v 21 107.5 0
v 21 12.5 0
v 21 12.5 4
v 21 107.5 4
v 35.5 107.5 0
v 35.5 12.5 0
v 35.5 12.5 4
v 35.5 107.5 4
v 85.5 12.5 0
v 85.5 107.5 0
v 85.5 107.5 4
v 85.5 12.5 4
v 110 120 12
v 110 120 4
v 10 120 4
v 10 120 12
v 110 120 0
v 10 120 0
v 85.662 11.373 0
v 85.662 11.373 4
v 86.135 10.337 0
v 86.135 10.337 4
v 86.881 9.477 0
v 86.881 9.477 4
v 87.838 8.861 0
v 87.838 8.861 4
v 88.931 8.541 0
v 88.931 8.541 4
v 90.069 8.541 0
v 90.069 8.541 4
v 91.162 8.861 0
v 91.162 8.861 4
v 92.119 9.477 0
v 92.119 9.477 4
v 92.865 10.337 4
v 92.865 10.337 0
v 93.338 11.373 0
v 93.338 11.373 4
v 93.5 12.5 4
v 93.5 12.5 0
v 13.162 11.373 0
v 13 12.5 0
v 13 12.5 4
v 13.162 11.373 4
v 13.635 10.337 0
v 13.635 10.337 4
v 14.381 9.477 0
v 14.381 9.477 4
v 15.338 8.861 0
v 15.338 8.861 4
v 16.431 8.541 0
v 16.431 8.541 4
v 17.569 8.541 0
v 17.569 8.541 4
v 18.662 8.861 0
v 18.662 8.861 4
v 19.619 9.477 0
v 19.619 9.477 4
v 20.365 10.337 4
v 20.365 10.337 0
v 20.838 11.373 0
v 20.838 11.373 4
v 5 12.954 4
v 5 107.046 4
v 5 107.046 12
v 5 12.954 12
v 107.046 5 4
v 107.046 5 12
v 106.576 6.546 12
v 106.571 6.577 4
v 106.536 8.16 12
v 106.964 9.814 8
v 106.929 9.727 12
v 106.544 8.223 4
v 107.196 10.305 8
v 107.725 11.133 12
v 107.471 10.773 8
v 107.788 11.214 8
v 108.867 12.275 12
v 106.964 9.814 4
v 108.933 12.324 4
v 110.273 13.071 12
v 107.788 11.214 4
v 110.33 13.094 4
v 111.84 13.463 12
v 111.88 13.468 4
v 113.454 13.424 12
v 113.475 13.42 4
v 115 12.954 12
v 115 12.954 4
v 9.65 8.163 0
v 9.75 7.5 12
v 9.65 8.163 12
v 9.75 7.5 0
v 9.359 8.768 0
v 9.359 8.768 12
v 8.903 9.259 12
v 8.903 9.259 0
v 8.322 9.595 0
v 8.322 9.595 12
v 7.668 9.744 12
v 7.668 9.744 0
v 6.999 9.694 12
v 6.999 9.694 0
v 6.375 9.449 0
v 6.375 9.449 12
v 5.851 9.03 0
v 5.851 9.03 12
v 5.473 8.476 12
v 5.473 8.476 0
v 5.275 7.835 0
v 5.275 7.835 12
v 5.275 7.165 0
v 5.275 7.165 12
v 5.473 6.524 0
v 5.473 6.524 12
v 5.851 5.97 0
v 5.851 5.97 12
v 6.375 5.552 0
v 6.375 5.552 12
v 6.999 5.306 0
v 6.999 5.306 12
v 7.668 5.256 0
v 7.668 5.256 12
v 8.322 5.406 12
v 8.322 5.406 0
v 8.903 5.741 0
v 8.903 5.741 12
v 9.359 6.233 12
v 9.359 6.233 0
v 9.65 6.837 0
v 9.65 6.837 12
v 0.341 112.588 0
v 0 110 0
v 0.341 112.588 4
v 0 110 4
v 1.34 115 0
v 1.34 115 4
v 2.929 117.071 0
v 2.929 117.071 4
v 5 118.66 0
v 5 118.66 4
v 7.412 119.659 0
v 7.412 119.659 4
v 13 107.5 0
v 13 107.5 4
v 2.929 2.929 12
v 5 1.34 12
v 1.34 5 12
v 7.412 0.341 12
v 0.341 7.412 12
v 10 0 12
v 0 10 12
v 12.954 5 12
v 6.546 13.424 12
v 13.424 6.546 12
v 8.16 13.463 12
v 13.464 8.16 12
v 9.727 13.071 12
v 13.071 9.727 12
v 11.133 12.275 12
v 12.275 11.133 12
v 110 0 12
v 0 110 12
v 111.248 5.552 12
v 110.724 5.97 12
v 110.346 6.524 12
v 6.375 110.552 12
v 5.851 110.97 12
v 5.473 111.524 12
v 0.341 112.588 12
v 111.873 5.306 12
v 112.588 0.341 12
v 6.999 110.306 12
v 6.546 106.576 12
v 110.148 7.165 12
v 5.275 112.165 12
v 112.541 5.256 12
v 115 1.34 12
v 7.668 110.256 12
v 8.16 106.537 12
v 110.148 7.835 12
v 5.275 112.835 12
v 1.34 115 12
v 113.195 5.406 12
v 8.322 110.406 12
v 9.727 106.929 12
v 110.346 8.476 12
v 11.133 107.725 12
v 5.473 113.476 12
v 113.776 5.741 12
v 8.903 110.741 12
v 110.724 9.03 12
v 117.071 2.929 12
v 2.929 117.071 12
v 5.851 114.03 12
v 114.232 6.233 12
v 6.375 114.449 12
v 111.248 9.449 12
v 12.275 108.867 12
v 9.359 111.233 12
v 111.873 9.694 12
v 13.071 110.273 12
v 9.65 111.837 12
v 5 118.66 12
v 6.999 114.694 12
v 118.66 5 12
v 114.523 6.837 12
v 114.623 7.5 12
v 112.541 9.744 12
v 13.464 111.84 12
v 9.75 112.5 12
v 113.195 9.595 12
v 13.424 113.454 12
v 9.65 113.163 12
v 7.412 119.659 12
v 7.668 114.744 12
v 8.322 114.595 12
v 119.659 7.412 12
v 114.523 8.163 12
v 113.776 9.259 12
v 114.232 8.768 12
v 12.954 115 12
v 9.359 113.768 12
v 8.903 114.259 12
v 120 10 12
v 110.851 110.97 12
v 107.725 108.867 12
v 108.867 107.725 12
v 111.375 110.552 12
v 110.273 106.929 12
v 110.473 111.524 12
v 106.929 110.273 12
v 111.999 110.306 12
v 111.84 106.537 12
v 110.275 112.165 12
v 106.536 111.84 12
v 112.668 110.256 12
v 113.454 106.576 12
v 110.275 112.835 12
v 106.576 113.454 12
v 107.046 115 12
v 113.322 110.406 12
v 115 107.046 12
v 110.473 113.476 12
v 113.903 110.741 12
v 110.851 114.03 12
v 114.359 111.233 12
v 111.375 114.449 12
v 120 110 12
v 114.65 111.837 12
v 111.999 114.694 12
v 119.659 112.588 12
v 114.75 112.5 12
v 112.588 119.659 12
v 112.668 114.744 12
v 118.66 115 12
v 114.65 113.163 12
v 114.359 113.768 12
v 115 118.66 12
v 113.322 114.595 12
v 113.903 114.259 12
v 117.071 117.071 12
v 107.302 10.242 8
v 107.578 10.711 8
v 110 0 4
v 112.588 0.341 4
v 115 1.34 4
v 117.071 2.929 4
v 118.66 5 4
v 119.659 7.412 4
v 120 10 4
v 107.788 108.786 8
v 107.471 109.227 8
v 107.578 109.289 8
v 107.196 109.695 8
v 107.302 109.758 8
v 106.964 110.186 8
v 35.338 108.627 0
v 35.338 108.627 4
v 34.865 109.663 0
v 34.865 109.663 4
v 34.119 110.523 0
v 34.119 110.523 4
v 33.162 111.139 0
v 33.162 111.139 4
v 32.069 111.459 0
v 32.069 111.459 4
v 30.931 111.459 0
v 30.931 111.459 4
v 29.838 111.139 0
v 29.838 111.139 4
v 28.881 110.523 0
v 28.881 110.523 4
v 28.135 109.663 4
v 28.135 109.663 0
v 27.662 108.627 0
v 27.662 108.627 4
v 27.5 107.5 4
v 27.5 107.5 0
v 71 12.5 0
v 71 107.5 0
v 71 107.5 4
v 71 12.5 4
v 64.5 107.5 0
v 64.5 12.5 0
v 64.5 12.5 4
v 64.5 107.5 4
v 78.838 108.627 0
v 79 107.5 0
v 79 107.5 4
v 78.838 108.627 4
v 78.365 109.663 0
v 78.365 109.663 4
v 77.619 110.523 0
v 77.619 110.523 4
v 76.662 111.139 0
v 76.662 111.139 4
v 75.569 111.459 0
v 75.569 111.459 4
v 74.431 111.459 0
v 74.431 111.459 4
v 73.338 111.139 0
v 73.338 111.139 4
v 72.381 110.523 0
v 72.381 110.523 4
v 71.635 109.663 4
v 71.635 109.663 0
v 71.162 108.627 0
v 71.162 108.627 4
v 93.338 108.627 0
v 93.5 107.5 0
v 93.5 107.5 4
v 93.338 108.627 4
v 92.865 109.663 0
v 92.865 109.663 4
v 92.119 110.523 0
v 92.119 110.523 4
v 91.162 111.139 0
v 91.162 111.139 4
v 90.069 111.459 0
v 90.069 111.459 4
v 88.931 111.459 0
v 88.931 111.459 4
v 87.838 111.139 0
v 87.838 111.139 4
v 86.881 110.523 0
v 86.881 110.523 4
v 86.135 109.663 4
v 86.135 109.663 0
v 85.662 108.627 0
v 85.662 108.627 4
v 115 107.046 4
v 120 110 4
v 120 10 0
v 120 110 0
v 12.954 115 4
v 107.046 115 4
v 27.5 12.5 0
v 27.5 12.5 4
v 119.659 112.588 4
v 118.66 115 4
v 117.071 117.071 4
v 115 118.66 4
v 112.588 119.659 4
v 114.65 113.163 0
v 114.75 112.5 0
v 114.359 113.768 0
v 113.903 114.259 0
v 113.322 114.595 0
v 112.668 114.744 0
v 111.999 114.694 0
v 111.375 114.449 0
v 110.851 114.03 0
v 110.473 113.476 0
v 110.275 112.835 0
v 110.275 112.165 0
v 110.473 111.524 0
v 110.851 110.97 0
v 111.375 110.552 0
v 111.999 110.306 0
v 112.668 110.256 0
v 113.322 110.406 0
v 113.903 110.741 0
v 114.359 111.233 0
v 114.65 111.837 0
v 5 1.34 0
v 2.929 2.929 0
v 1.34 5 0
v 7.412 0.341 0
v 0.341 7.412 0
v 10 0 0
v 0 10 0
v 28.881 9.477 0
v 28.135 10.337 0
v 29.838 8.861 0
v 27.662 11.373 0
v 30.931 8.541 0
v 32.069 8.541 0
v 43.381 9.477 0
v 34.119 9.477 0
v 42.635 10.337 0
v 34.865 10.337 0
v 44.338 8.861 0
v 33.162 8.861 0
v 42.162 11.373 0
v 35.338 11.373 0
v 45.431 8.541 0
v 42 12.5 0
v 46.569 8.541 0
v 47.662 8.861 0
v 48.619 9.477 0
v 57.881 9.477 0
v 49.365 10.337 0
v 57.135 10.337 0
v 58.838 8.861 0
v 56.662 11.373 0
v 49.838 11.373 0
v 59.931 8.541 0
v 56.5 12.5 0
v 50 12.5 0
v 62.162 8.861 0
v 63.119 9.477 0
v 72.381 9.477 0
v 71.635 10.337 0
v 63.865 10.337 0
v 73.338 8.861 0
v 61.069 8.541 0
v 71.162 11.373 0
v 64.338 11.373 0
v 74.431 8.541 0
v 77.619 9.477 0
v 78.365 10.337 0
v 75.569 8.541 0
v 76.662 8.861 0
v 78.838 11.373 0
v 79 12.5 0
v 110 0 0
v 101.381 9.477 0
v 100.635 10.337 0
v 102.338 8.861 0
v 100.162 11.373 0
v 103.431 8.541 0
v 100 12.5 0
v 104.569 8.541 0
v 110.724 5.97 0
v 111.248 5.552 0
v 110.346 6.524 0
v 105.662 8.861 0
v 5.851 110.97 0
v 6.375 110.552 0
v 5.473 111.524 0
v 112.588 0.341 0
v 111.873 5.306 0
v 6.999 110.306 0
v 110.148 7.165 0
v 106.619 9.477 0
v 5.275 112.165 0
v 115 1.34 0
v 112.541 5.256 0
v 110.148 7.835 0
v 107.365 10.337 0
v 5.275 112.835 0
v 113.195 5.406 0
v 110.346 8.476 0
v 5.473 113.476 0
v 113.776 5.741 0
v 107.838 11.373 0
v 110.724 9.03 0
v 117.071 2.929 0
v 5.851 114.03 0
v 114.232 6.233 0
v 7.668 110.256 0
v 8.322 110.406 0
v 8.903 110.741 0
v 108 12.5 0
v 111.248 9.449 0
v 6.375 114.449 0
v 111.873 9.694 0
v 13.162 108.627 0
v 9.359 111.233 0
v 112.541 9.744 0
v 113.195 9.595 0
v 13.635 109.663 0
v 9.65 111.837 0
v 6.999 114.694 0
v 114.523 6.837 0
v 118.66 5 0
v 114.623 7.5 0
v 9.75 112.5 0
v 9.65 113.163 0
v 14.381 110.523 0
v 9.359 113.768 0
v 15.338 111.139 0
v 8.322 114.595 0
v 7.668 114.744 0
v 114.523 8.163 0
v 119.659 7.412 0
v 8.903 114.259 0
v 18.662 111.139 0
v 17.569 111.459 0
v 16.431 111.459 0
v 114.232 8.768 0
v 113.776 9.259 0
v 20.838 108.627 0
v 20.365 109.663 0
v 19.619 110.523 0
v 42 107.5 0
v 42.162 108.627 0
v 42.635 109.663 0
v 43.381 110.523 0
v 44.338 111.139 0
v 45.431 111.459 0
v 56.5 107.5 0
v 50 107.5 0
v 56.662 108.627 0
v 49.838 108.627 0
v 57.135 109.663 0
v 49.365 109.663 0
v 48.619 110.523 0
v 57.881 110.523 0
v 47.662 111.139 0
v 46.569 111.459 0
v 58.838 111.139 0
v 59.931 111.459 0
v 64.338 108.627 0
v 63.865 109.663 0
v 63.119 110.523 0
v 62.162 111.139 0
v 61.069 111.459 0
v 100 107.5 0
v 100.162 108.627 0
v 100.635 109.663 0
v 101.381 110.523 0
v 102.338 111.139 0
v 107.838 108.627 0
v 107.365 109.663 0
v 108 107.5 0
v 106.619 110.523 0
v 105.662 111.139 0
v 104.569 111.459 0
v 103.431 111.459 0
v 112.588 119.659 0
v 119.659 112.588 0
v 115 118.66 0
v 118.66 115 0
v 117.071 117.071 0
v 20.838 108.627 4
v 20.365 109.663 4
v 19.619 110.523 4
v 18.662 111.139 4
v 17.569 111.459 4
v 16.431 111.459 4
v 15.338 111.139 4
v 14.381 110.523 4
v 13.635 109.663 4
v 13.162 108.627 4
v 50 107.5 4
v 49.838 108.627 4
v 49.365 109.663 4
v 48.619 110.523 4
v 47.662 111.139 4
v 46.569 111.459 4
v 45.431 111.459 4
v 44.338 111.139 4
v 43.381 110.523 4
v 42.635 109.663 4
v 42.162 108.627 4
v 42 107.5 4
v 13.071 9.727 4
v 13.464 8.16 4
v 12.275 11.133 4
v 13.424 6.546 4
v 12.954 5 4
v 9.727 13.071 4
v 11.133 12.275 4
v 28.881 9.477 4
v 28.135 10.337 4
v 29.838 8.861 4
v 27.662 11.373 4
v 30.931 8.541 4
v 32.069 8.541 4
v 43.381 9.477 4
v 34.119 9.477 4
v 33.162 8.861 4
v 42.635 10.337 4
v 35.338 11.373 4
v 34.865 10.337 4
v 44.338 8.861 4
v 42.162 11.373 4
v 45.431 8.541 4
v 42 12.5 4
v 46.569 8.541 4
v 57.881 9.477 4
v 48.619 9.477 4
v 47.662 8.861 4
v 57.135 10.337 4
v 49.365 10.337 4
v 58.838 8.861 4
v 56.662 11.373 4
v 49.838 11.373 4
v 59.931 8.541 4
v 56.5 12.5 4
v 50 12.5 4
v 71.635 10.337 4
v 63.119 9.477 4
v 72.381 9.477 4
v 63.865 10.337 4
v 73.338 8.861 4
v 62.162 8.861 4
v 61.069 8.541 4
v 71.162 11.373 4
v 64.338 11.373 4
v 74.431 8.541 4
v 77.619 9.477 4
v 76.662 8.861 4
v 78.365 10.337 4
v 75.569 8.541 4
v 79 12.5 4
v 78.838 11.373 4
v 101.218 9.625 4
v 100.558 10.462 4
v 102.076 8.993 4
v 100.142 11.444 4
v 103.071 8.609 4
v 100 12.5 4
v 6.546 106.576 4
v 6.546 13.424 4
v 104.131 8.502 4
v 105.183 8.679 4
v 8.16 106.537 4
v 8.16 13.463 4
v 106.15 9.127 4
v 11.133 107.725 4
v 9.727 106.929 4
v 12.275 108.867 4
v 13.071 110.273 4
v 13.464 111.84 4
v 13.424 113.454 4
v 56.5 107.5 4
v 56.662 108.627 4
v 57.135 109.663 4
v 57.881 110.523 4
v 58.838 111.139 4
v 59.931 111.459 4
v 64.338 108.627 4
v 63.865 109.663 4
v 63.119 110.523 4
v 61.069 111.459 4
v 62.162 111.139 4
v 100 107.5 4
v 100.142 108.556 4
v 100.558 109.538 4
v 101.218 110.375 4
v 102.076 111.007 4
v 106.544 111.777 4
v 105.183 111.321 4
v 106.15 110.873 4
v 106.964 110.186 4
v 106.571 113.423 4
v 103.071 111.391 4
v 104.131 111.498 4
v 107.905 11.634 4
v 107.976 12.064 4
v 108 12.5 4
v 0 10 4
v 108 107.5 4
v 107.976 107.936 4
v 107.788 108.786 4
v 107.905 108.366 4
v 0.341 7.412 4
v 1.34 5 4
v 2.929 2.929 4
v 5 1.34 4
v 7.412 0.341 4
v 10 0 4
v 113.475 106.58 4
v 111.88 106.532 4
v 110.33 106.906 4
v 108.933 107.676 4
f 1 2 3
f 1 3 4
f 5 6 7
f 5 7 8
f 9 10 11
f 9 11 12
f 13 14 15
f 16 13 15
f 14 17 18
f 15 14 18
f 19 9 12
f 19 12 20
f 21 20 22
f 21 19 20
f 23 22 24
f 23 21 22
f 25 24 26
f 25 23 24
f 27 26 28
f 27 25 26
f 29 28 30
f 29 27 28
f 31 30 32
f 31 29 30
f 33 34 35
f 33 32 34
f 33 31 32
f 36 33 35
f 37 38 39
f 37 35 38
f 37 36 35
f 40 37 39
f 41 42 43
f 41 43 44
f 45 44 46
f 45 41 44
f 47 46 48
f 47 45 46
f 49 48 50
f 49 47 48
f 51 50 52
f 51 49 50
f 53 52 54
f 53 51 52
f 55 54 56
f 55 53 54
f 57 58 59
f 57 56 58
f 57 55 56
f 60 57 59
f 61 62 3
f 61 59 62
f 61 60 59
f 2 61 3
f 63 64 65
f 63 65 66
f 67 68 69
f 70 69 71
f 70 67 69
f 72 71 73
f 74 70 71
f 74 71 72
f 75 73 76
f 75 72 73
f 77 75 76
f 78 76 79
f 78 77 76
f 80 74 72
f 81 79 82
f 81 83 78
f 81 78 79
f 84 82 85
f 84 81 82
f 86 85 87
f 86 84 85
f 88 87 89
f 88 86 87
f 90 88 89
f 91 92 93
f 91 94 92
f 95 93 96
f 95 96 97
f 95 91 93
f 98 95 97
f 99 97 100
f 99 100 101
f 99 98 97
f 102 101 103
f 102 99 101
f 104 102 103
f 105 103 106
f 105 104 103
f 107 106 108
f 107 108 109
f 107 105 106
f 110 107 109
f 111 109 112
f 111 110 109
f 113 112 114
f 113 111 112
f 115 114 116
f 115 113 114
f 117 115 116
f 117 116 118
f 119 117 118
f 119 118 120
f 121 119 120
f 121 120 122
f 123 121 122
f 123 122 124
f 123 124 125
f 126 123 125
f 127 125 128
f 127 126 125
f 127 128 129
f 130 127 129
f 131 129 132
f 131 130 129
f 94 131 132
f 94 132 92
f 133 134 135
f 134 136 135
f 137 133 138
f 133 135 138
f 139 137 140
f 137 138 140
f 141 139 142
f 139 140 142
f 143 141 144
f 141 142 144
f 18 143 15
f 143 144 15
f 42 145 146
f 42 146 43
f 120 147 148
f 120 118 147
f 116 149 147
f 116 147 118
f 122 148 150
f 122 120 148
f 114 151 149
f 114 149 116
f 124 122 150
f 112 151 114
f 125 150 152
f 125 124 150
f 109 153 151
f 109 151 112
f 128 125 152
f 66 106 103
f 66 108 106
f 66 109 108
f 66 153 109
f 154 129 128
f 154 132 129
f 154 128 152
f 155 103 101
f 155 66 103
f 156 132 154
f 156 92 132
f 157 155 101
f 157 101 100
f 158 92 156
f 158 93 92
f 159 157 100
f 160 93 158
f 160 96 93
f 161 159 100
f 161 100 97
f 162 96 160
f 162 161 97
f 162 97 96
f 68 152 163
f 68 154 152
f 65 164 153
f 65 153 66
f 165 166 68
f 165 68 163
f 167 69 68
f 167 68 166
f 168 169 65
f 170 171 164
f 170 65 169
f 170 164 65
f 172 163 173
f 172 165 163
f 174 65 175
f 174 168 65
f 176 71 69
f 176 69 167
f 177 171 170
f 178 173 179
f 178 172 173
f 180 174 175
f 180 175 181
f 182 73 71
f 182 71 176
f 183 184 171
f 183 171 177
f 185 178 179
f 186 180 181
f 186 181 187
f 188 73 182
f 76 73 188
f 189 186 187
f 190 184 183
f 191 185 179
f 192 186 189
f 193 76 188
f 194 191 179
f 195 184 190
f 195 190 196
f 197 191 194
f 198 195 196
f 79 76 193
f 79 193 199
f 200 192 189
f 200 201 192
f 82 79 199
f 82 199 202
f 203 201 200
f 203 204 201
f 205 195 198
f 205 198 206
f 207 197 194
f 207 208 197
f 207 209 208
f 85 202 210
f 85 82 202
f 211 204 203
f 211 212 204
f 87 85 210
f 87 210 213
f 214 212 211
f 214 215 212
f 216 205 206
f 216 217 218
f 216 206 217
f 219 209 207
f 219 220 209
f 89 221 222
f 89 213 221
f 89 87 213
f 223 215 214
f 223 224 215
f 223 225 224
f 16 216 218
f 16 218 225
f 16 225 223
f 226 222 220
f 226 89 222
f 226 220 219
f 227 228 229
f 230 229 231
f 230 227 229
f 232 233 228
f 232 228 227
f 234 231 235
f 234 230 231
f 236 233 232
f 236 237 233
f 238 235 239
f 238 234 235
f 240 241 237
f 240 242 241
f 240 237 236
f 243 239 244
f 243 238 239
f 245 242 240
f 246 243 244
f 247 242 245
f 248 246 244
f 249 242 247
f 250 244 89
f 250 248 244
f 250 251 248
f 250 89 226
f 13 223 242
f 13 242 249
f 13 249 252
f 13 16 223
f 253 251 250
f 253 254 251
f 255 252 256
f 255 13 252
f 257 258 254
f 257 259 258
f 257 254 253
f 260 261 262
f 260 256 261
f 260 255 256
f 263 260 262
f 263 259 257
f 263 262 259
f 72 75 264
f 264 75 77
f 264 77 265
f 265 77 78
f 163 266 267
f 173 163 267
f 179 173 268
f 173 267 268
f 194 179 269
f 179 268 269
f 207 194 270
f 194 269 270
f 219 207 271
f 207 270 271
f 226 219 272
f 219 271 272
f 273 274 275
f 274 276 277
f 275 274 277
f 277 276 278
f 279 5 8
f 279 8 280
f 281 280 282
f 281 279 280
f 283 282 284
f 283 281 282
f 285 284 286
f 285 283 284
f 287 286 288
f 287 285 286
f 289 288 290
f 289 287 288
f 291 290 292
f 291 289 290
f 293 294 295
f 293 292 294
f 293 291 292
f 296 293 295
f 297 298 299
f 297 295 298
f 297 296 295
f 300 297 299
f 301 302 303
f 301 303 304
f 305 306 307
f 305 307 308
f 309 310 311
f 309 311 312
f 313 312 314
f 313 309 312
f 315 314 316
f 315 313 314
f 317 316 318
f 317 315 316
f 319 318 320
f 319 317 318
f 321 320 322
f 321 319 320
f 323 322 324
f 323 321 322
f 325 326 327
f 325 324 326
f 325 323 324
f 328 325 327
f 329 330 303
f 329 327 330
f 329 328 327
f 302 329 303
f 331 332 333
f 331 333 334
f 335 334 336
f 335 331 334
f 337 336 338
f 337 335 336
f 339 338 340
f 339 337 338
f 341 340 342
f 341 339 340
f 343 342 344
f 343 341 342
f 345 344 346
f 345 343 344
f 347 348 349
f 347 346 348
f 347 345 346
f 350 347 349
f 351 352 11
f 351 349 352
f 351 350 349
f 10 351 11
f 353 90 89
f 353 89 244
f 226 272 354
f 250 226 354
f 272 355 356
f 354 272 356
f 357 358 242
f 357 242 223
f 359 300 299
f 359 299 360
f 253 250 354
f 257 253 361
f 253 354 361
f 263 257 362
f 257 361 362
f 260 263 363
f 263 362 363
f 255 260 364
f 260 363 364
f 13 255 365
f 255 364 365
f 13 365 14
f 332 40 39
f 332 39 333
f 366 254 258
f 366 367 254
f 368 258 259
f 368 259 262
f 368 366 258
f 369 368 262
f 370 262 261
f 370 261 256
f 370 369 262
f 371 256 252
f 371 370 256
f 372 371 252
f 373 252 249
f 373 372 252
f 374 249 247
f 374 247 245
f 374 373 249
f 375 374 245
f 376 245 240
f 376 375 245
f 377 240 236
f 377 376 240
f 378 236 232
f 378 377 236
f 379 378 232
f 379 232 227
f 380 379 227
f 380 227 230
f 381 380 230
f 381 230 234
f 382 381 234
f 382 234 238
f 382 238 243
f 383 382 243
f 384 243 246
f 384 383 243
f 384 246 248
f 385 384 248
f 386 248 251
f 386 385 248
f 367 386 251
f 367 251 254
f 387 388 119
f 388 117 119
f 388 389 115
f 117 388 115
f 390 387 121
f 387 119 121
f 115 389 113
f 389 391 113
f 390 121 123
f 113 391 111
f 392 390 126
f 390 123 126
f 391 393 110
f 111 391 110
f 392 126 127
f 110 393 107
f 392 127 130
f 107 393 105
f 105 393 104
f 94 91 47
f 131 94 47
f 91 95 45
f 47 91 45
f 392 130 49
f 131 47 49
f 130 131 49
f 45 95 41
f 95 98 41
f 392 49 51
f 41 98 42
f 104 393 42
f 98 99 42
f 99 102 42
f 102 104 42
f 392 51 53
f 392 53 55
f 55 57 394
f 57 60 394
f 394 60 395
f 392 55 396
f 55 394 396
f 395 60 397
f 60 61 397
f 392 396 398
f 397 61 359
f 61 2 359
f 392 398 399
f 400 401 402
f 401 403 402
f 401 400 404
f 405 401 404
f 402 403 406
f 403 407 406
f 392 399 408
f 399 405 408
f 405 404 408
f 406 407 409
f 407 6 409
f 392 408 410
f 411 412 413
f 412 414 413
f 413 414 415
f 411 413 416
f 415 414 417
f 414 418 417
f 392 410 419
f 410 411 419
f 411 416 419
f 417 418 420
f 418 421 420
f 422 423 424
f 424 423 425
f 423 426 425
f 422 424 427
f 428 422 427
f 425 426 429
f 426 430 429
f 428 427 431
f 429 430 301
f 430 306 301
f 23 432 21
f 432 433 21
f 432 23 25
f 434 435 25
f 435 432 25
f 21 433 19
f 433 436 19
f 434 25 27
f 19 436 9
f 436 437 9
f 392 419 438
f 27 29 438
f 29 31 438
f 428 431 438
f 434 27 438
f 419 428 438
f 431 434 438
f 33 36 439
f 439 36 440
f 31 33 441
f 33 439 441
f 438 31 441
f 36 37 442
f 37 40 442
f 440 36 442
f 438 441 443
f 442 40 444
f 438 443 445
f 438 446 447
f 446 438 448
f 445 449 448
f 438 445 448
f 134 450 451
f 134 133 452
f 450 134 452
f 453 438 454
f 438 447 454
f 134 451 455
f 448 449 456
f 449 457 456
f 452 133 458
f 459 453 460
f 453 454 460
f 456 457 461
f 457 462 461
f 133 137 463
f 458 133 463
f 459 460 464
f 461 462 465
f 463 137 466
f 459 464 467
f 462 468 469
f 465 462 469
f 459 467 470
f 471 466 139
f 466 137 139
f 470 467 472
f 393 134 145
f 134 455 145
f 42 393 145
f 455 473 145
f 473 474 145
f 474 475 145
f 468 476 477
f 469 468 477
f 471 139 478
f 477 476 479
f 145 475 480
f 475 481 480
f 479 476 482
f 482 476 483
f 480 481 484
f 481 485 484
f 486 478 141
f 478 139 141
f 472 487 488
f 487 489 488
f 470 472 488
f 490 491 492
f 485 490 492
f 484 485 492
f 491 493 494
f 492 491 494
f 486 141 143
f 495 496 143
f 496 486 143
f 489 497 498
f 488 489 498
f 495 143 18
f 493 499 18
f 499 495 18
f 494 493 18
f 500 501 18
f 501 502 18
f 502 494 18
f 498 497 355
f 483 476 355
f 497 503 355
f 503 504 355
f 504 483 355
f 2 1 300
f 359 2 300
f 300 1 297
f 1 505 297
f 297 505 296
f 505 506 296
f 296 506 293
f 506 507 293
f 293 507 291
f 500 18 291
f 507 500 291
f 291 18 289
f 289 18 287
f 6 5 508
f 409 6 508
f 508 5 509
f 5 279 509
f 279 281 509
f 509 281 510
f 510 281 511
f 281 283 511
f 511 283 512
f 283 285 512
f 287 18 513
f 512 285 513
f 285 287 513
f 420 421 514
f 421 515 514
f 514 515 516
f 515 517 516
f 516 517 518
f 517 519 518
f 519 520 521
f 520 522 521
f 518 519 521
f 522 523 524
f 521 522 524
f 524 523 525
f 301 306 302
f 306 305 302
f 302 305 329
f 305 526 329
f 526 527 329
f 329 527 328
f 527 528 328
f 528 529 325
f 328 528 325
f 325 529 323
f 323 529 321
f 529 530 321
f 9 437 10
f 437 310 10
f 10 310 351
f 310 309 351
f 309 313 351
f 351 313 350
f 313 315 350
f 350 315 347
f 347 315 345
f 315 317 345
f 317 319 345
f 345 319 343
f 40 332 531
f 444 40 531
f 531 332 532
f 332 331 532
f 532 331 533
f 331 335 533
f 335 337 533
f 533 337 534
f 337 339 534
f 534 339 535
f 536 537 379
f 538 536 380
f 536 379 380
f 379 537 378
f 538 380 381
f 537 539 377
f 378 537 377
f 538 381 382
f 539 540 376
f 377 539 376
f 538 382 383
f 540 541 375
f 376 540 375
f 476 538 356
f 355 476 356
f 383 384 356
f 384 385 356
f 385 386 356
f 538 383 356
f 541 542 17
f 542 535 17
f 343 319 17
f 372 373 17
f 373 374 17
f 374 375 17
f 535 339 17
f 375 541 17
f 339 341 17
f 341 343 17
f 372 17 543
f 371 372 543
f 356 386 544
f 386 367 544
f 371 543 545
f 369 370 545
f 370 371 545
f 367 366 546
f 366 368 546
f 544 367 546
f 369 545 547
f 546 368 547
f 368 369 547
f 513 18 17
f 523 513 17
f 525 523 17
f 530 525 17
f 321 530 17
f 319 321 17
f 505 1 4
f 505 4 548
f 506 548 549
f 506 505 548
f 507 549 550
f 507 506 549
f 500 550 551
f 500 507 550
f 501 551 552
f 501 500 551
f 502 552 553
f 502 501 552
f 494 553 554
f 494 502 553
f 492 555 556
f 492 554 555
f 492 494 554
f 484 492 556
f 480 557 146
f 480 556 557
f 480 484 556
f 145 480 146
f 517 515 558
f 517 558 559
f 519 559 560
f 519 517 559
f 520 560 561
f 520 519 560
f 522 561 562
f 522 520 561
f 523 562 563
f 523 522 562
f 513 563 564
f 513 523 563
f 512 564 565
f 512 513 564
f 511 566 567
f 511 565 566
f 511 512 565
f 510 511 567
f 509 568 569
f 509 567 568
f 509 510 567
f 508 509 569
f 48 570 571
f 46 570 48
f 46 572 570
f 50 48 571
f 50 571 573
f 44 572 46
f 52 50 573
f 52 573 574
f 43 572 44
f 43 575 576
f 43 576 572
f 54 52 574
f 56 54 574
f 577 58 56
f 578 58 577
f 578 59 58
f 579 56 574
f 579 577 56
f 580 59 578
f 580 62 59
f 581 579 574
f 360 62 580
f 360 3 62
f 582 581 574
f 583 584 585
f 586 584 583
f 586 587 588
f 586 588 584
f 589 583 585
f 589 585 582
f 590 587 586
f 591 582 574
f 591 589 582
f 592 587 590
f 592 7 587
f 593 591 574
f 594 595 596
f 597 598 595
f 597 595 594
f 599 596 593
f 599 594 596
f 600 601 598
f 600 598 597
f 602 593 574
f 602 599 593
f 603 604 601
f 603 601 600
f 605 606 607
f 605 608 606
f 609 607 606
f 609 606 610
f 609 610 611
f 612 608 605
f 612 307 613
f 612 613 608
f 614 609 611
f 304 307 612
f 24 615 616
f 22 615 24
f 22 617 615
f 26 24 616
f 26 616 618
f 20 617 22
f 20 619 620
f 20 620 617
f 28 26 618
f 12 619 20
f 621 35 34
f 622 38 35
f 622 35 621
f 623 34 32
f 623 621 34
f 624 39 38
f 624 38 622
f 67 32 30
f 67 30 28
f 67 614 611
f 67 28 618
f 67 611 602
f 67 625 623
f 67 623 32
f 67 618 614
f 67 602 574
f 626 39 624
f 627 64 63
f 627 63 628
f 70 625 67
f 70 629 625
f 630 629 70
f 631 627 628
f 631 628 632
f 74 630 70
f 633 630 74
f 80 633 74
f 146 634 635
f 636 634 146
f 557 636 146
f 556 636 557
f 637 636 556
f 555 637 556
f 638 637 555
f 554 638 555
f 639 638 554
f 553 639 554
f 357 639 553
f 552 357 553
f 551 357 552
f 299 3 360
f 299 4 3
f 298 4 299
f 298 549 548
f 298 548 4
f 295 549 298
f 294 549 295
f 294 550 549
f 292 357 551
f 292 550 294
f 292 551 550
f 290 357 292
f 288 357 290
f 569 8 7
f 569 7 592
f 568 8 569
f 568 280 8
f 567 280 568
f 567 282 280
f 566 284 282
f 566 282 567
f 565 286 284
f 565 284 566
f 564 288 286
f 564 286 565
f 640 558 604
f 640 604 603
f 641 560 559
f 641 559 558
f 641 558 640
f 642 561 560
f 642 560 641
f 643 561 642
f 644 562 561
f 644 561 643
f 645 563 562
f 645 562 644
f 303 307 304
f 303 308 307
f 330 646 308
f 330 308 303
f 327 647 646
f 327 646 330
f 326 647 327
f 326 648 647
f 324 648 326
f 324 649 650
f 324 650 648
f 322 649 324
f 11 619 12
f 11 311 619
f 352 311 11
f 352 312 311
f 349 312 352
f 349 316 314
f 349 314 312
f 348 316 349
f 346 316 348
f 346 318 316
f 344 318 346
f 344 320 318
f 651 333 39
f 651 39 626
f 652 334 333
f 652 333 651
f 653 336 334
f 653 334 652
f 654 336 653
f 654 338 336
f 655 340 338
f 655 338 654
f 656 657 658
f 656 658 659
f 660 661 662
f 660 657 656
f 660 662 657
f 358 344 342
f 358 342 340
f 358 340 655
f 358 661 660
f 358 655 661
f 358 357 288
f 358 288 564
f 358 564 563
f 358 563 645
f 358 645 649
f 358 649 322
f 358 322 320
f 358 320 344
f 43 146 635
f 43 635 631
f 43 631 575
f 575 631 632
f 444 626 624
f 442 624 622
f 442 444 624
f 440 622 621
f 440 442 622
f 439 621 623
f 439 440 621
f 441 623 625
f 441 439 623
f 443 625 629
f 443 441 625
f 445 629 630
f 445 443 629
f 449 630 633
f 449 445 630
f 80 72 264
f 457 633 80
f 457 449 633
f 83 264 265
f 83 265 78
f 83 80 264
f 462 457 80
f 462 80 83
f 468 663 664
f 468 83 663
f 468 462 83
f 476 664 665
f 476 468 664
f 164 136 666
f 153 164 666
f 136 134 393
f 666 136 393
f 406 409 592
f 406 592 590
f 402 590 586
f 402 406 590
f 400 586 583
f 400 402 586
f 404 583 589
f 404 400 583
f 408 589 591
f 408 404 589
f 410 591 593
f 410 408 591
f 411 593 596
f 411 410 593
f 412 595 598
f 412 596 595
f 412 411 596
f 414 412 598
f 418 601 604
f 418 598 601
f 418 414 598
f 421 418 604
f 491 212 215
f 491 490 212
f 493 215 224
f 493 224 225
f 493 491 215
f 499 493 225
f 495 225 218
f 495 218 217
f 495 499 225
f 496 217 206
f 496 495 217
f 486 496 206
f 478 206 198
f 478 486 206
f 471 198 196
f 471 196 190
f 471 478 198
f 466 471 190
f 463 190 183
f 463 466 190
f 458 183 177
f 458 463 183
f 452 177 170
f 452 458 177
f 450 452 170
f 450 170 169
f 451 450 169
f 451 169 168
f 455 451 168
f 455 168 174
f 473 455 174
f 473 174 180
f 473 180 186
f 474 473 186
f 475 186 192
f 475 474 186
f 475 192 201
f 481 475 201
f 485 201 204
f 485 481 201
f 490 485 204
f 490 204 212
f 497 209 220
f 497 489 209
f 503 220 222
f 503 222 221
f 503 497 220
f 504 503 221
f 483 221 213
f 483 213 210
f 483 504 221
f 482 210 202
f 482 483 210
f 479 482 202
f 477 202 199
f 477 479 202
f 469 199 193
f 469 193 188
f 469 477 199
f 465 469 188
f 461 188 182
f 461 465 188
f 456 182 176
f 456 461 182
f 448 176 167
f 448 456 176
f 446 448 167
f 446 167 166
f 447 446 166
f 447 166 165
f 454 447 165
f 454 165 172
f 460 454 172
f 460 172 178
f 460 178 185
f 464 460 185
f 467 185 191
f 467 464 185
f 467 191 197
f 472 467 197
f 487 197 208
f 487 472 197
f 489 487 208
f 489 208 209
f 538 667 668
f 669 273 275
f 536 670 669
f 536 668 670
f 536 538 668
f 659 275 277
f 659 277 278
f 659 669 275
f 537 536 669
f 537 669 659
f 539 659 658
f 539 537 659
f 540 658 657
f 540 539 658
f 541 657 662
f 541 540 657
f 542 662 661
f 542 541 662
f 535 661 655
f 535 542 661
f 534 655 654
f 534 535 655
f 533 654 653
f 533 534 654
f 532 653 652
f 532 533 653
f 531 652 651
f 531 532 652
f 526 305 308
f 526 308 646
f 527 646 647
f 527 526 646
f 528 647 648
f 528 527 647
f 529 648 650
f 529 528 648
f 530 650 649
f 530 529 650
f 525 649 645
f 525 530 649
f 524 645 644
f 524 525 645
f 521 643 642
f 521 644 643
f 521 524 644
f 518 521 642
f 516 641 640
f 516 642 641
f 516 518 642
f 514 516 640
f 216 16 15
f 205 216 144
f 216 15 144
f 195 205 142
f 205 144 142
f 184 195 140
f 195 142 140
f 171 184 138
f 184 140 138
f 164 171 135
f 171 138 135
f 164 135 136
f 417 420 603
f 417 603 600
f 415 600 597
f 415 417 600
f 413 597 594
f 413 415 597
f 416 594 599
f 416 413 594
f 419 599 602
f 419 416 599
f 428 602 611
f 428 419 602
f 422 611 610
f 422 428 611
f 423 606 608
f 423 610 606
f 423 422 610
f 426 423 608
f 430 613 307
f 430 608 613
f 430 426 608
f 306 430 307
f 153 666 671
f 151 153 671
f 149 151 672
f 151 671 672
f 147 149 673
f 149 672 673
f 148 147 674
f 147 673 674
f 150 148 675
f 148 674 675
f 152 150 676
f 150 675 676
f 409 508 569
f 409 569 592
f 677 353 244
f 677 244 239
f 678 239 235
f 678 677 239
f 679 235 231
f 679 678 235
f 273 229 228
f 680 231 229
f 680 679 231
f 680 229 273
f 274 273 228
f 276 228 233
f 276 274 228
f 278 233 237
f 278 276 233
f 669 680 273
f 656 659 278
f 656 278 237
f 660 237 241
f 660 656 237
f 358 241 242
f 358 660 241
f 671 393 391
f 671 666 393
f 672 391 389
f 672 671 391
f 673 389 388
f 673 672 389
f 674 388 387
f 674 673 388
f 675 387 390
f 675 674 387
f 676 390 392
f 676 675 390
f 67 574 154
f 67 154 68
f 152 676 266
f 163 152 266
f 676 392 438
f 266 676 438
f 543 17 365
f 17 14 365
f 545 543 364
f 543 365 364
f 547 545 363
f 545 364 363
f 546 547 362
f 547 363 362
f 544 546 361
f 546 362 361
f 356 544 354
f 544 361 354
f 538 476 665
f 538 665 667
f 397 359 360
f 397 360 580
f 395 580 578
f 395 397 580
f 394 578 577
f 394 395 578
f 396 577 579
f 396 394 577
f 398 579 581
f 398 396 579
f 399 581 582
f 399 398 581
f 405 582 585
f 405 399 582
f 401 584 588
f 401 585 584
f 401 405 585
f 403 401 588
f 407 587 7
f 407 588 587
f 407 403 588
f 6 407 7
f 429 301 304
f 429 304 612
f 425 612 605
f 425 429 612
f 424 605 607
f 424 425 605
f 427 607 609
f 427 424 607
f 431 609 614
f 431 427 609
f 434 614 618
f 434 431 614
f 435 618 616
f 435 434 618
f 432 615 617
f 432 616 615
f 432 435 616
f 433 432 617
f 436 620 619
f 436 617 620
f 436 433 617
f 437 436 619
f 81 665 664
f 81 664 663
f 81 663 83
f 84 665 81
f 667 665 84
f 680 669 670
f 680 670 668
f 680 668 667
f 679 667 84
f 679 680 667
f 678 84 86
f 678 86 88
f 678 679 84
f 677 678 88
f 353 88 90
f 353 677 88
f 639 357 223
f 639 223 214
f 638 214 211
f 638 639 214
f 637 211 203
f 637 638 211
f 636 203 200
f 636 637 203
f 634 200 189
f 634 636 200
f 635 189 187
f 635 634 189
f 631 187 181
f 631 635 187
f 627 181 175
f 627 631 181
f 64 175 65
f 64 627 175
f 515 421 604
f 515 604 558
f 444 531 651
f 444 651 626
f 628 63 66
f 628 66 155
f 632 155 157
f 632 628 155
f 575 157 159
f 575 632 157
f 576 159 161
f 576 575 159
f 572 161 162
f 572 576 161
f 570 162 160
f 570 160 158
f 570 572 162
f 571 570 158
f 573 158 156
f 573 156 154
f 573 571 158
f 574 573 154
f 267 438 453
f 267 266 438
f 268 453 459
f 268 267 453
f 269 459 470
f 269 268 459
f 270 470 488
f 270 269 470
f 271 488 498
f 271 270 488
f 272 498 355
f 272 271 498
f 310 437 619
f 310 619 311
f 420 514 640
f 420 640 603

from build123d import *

# Parameters (mm, degrees)
SKETCH1_W           = 120
SKETCH1_H           = 120
SKETCH1_R           = 2.25
BOSS_EXTRUDE1_DEPTH = 4
FILLET1_R           = 10
SKETCH2_R           = 2.25
BOSS_EXTRUDE2_DEPTH = 8
CUT_EXTRUDE1_DEPTH  = 8


with BuildPart() as part:
    # Sketch1 → Boss-Extrude1 (new body)
    with BuildSketch(Plane.XY):
        with Locations((60, 60)):
            Rectangle(SKETCH1_W, SKETCH1_H)
        with Locations((7.5, 112.500076468)):
            Circle(SKETCH1_R, mode=Mode.SUBTRACT)
        with Locations((112.5, 112.500076468)):
            Circle(SKETCH1_R, mode=Mode.SUBTRACT)
        with Locations((7.5, 7.500076468)):
            Circle(SKETCH1_R, mode=Mode.SUBTRACT)
        with Locations((112.373278687, 7.500076468)):
            Circle(SKETCH1_R, mode=Mode.SUBTRACT)
    extrude(amount=BOSS_EXTRUDE1_DEPTH)

    # Fillet1
    fillet1_edges = [part.edges().sort_by_distance(p)[0] for p in [
        (0, 120, 2),
        (120, 120, 2),
        (120, 0, 2),
        (0, 0, 2),
    ]]
    fillet(fillet1_edges, radius=FILLET1_R)

    # Sketch2 → Boss-Extrude2 (add)
    with BuildSketch(Plane.XY.offset(4)):
        with BuildLine():
            Line((0, 110), (0, 10))
            ThreePointArc((0, 10), (2.928932188, 2.928932188), (10, 0))
            Line((10, 0), (110, 0))
            ThreePointArc((110, 0), (117.071067812, 2.928932188), (120, 10))
            Line((120, 10), (120, 110))
            ThreePointArc((120, 110), (117.071067812, 117.071067812), (110, 120))
            Line((110, 120), (10, 120))
            ThreePointArc((10, 120), (2.928932188, 117.071067812), (0, 110))
        make_face()
        with Locations((7.5, 7.500076468)):
            Circle(SKETCH2_R, mode=Mode.SUBTRACT)
        with Locations((112.373278687, 7.500076468)):
            Circle(SKETCH2_R, mode=Mode.SUBTRACT)
        with Locations((112.5, 112.500076468)):
            Circle(SKETCH2_R, mode=Mode.SUBTRACT)
        with Locations((7.5, 112.500076468)):
            Circle(SKETCH2_R, mode=Mode.SUBTRACT)
        with BuildLine():
            Line((5, 107.045720411), (5, 12.954279589))
            ThreePointArc((5, 12.954279589), (11.742610947, 11.742593959), (12.954391106, 5))
            Line((12.954391106, 5), (107.045608894, 5))
            ThreePointArc((107.045608894, 5), (108.257389053, 11.742593959), (115, 12.954279589))
            Line((115, 12.954279589), (115, 107.045720411))
            ThreePointArc((115, 107.045720411), (108.257389053, 108.257406041), (107.045608894, 115))
            Line((107.045608894, 115), (12.954391106, 115))
            ThreePointArc((12.954391106, 115), (11.742610947, 108.257406041), (5, 107.045720411))
        make_face(mode=Mode.SUBTRACT)
    extrude(amount=BOSS_EXTRUDE2_DEPTH)

    # Sketch3 → Cut-Extrude1 (cut)
    with BuildSketch(Plane(origin=(0, 0, 0), x_dir=(-1, 0, 0), z_dir=(0, 0, -1))):
        with BuildLine():
            Line((-100, 107.5), (-100, 12.5))
            ThreePointArc((-100, 12.5), (-104, 8.5), (-108, 12.5))
            Line((-108, 12.5), (-108, 107.5))
            ThreePointArc((-108, 107.5), (-104, 111.5), (-100, 107.5))
        make_face()
        with BuildLine():
            Line((-85.5, 107.5), (-85.5, 12.5))
            ThreePointArc((-85.5, 12.5), (-89.5, 8.5), (-93.5, 12.5))
            Line((-93.5, 12.5), (-93.5, 107.5))
            ThreePointArc((-93.5, 107.5), (-89.5, 111.5), (-85.5, 107.5))
        make_face()
        with BuildLine():
            Line((-71, 107.5), (-71, 12.5))
            ThreePointArc((-71, 12.5), (-75, 8.5), (-79, 12.5))
            Line((-79, 12.5), (-79, 107.5))
            ThreePointArc((-79, 107.5), (-75, 111.5), (-71, 107.5))
        make_face()
        with BuildLine():
            Line((-56.5, 107.5), (-56.5, 12.5))
            ThreePointArc((-56.5, 12.5), (-60.5, 8.5), (-64.5, 12.5))
            Line((-64.5, 12.5), (-64.5, 107.5))
            ThreePointArc((-64.5, 107.5), (-60.5, 111.5), (-56.5, 107.5))
        make_face()
        with BuildLine():
            Line((-42, 107.5), (-42, 12.5))
            ThreePointArc((-42, 12.5), (-46, 8.5), (-50, 12.5))
            Line((-50, 12.5), (-50, 107.5))
            ThreePointArc((-50, 107.5), (-46, 111.5), (-42, 107.5))
        make_face()
        with BuildLine():
            Line((-27.5, 107.5), (-27.5, 12.5))
            ThreePointArc((-27.5, 12.5), (-31.5, 8.5), (-35.5, 12.5))
            Line((-35.5, 12.5), (-35.5, 107.5))
            ThreePointArc((-35.5, 107.5), (-31.5, 111.5), (-27.5, 107.5))
        make_face()
        with BuildLine():
            Line((-13, 107.5), (-13, 12.5))
            ThreePointArc((-13, 12.5), (-17, 8.5), (-21, 12.5))
            Line((-21, 12.5), (-21, 107.5))
            ThreePointArc((-21, 107.5), (-17, 111.5), (-13, 107.5))
        make_face()
    extrude(amount=-CUT_EXTRUDE1_DEPTH, mode=Mode.SUBTRACT)


solid = part.part
